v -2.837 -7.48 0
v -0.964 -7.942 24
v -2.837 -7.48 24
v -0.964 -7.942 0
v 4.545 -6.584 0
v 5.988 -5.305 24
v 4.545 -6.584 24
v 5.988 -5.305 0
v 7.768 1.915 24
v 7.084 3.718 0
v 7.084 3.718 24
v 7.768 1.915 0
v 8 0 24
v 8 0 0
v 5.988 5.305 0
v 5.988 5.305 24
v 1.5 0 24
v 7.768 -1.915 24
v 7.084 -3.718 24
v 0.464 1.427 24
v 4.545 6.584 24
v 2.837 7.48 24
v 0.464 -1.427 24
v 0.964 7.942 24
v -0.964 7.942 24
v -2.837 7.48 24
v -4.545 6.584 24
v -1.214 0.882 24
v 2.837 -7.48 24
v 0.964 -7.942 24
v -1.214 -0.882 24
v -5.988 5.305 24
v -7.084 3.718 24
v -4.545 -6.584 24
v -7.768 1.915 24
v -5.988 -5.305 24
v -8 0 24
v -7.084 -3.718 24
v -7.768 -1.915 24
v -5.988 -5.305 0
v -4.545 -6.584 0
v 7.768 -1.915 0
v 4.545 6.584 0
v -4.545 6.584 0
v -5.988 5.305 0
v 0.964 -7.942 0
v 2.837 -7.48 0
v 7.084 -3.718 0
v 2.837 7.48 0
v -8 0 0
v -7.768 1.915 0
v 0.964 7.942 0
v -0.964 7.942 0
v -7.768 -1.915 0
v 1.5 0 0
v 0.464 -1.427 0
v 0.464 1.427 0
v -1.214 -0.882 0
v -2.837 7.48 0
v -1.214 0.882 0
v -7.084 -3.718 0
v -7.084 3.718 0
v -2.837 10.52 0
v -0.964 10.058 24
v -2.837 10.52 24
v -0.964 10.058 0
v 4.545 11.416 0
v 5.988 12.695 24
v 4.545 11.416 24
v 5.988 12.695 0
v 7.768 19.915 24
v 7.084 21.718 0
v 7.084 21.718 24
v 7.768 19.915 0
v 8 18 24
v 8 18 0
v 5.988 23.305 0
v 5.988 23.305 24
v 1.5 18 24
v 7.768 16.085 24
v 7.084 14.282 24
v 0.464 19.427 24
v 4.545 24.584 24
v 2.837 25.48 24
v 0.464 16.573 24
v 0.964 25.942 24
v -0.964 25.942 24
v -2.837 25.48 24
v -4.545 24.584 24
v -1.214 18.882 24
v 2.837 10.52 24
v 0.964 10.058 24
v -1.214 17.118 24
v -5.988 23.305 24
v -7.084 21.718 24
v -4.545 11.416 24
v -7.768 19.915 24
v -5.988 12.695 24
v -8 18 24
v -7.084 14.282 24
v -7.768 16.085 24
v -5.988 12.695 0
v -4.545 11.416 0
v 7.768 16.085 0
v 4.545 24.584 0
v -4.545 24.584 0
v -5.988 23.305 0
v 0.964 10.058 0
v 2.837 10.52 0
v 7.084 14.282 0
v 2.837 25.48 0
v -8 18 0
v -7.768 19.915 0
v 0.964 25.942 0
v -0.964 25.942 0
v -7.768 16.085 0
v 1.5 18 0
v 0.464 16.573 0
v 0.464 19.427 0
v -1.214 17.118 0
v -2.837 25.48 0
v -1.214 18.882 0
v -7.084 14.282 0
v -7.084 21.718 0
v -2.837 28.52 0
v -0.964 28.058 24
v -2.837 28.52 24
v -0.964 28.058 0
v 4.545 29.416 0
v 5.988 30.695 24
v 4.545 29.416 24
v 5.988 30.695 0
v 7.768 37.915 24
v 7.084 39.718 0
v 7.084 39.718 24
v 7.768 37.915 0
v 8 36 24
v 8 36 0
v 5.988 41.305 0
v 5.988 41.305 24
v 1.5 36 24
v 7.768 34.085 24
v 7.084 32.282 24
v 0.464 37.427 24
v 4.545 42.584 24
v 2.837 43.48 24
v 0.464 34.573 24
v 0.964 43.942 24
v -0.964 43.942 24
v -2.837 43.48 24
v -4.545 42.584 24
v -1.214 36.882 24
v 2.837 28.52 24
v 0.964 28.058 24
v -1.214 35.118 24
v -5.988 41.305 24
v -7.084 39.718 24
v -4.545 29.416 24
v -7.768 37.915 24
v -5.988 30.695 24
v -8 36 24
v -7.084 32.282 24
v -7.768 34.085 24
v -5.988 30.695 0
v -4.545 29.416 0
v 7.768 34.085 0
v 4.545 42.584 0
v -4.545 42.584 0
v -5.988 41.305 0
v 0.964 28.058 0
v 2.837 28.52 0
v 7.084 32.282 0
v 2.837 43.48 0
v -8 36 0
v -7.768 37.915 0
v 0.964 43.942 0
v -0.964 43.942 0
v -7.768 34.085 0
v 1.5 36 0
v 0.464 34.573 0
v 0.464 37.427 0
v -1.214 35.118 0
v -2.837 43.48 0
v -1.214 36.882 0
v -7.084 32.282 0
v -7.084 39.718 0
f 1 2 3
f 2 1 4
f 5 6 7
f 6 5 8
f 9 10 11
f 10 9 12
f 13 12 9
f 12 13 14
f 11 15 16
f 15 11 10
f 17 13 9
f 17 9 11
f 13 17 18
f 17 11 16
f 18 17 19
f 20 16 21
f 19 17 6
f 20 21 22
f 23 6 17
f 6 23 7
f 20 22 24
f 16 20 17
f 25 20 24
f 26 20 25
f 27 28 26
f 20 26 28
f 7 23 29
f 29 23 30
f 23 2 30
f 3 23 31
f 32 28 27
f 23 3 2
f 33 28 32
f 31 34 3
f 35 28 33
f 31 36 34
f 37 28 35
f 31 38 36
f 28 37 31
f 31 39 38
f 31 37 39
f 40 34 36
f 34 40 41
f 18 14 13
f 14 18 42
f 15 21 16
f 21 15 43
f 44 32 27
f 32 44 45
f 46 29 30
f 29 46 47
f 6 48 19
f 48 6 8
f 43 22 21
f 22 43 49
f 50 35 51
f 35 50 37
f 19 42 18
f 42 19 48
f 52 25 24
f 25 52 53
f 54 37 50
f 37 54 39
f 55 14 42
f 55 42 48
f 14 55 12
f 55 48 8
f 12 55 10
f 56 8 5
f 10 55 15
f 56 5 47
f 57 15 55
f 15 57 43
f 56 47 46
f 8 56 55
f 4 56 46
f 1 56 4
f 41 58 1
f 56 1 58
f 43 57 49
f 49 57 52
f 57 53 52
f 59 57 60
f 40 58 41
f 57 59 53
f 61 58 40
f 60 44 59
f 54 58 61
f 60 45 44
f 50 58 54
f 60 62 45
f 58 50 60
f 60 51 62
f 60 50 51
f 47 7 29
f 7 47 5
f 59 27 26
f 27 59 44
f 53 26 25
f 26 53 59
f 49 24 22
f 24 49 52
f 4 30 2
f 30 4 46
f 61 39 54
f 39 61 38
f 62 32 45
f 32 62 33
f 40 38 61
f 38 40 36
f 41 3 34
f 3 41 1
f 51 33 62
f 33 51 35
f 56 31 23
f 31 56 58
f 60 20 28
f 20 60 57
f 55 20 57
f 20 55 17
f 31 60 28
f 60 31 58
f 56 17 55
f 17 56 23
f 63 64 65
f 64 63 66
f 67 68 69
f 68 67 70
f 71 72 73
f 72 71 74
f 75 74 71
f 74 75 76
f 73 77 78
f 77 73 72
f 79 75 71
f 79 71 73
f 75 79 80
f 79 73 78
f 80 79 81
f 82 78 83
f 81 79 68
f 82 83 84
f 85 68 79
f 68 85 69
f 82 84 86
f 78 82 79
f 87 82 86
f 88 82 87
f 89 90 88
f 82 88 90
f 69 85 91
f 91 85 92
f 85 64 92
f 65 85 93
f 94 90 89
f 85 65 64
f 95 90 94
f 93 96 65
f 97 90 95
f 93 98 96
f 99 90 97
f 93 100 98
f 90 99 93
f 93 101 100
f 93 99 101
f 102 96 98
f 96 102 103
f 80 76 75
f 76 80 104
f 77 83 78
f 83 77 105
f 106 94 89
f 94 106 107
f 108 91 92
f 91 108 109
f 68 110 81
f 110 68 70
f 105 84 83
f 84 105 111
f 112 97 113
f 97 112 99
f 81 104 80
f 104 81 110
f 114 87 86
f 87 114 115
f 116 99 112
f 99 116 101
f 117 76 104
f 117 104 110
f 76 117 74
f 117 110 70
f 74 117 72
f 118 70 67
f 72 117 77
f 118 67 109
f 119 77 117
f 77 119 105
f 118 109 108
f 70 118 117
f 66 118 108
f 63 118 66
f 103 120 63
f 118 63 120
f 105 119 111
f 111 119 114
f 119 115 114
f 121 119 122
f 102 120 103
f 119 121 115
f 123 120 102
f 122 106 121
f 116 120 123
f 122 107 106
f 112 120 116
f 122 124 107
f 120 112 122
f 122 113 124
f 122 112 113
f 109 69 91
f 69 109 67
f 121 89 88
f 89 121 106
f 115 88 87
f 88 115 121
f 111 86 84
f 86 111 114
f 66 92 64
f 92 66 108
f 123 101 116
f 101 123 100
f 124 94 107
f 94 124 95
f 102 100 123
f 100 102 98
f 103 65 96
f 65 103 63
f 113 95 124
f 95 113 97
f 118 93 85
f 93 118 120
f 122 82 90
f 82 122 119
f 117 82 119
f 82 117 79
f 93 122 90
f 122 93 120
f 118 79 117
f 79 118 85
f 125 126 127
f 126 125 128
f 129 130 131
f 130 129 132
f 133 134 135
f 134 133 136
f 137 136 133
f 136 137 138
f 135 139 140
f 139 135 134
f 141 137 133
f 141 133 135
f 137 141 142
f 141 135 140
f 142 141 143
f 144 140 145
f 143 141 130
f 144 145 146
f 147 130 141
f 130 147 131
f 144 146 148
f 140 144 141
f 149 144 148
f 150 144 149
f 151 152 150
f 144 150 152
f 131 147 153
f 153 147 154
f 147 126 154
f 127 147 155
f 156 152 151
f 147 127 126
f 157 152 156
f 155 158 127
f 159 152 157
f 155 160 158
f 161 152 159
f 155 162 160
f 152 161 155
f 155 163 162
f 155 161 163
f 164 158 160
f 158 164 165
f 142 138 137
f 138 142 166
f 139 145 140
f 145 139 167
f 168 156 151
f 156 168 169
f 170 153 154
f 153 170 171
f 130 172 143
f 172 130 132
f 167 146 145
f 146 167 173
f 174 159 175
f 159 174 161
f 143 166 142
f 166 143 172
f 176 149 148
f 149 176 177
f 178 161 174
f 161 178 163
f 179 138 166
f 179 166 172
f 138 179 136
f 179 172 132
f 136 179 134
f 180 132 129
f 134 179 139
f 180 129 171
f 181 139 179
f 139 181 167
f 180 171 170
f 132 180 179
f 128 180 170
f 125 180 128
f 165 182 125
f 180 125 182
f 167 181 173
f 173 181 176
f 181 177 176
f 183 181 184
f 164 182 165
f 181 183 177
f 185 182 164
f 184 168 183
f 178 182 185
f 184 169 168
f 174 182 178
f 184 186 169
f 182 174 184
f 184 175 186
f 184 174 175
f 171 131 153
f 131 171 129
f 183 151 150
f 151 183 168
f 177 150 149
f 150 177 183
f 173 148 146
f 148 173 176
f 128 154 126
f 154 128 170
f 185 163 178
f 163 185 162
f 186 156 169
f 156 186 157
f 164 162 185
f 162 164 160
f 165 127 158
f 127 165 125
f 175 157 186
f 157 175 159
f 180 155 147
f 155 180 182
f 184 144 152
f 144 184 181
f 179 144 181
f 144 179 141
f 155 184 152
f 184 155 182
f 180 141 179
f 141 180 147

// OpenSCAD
display=0;

sheet_thickness=6.25;
backplate_width=400;
backplate_height=400;
bottomplate_depth=200;

sideplate_height=150;
sideplate_depth=150;

slide_width=105;

//---------------------------------------------------------------------------
//_____________________ACRYLIC SHEETS__________________________________________

module bottomplate (){
	difference(){
		union(){
			translate([0,-bottomplate_depth,0])
			cube([backplate_width,bottomplate_depth,sheet_thickness]);
		}
	}
}

module backplate (){
	difference(){
		union(){
			translate([0,0,0])
			cube([backplate_width,sheet_thickness,backplate_height]);
		}
		translate([275,20,220])
		rotate([90,0,0])
		cylinder(r=4,h=100);		
	}
}

module beltplate (){
	union(){
		difference(){
			union(){
				translate([50,50,0])
				cylinder(r=50,h=sheet_thickness);	
				translate([180,50,0])
				cylinder(r=50,h=sheet_thickness);	
			}	
		translate([50,0,-1])
		cube([130,100,sheet_thickness+2]);
		}
		translate([50,0,0])
		cube([130,100,sheet_thickness]);	
	}	
}

module beltplate_holes (){
	translate([25,80,-50])
	cylinder(r=1.7,h=100);
	translate([25,20,-50])
	cylinder(r=1.7,h=100);

	translate([230-10,50,-50])
	cylinder(r=1.7,h=100);
}


module sideplateleft(){
	union(){
		translate([sheet_thickness,0,sheet_thickness])
		rotate([0,-90,0])
		linear_extrude(height=sheet_thickness)
		polygon(points=[[0,0],[0,-sideplate_depth],[sideplate_height,0]], paths=[[0,1,2]]);
		
		translate([0,-50,sheet_thickness])
		cube([sheet_thickness,50,230-sheet_thickness]);
	}
}

module sideplateright(){

	translate([backplate_width,0,sheet_thickness])
	rotate([0,-90,0])
	linear_extrude(height=sheet_thickness)

	polygon(points=[[0,0],[0,-sideplate_depth],[sideplate_height,0]], paths=[[0,1,2]]);

}

module leftslide(){
	cube([248,slide_width,sheet_thickness]);
}

module rightslide(){
	cube([186,slide_width,sheet_thickness]);
}

module slidefront(){
	difference(){
		linear_extrude(height=	sheet_thickness)
		polygon(points=[[50,0],[50,5],[234,170],[318,170],[backplate_width,5],[backplate_width,0]] , paths=[[0,1,2,3,4,5]]);	
	
	}
}

module elecfront(){
	difference(){
		translate([0,-sheet_thickness-slide_width,backplate_height])
		rotate([-90,0,0])
		linear_extrude(height=
	sheet_thickness)
		polygon(points=[[0,0],[0,170],[234,170],[50,5],[50,0]] , paths=[[0,1,2,3,4,5]]);	
	
	}
}

module elecleft (){
	difference(){
		translate([0,-slide_width,230+sheet_thickness])
		cube([sheet_thickness,slide_width,	backplate_height-230-sheet_thickness*2]);
	}
}

module electop (){
	difference(){
		translate([0,-slide_width,backplate_height-sheet_thickness])
		cube([48,slide_width,sheet_thickness]);
	}
}

module elecbottom (){
	difference(){
		translate([0,-slide_width,230])
		cube([234-4,slide_width,sheet_thickness]);
	}
}

module elecfront_connectors (){
	difference(){
		cube([24,sheet_thickness,12]);
		translate([12,-1,6])
		rotate([-90,0,0])
		cylinder(r=1.7,h=100);
	}


}

//-------------------------------------------------------------------------
//___________________________3D PRINTED PARTS______________________________

module rotor(){
	difference(){
		union(){
			translate([0,0,0])
			cylinder(r=33.7,h=89,$fn=100);
			for ( i = [-100,-75,-50,-25,0,25,50,75,100] )
			{
			    rotate( [0, 0,  i ])
			    translate([0, 31.5, 0])
			    cylinder(r=3,h=89,$fn=20);
			}
		}	
		translate([0,25,-1])
		cylinder(r=8.6,h=110,$fn=50);
		translate([0,27,-1])
		cylinder(r=8.7,h=110,$fn=50);

		translate([-8,24,-1]) 
		rotate([0,0,15])
		cube([5,40,110]);

		translate([8,24,-1])
		rotate([0,0,-15])
		translate([-5,0,0])
		cube([5,40,110]);

		translate([0,0,-2])
		cylinder(r=4.1,h=150,$fn=25);
	}
}

module sled(){
	difference(){
		union(){
			intersection(){
				translate([0,-10,0])	
				cylinder(r=26,h=12,$fn=100);
				translate([0,-38,-1])	
				cylinder(r=40,h=50,$fn=100);	
			}		
			translate([0,-25,0])	
			cylinder(r=10,h=36,$fn=50);
			translate([-88,-33.5,0])
			cube([85,13,12]);
			translate([-88,-33.5,0])
			cube([18,13,26]);

		}	
	translate([0,-27,-1])	
	cylinder(r=3.1,h=100,$fn=20);
	translate([17.5,-12,-1])	
	cylinder(r=4,h=50);
	translate([-17.5,-12,-1])	
	cylinder(r=4,h=50);

	translate([0,-27,-0.1])
	difference(){
		translate([-15,-3.5,0])
		cube([15,7,25]);
		translate([-25,-4.5,25])
		rotate([-90,0,0])
		cylinder(r=22,h=9);
	}
	
	translate([0,-27,1])	
	rotate([0,-90,0])
	rotate([0,0,30])
	cylinder(r=3.6,h=100,$fn=6);	

	translate([-80,-27,15.5])	
	cylinder(r=4.7,h=100,$fn=20);

	translate([-80,-40,19])	
	rotate([-90,0,0])
	cylinder(r=2,h=100,$fn=6);
	}
}


module frontplate(){
	difference(){
		union(){
			translate([0,0,0])
			linear_extrude(height = 5, center = false, convexity = 10, twist = 0)
			polygon(points=[[25,0],[42,10],[42,22],[-41,22],[-41,10],[-25,0]]);
			intersection() {
				cylinder(r=36,h=5,$fn=100);
				translate([0,15,-1])
				cylinder(r=29,h=7,$fn=100);	
			}			
			translate([-17.5,12,0])
			cylinder(r=10.5,h=48,$fn=100);	
			translate([17.5,12,0])
			cylinder(r=10.5,h=48,$fn=100);	

			translate([0,0,0])
			cylinder(r=14,h=7.5,$fn=100);	
			
		}	
	translate([0,0,-1])
	cylinder(r=7,h=100);	

	translate([17.5,12,-1])
	cylinder(r=5.5,h=100);	

	translate([-17.5,12,-1])
	cylinder(r=5.5,h=100);	

	translate([0,27,-1])
	cylinder(r=7,h=7,$fn=40);

	translate([-17.5,12,49-24])
	cylinder(r=7.75,h=38,$fn=40);	 
	translate([17.5,12,49-24])
	cylinder(r=7.75,h=38,$fn=40);	

	translate([0,0,2])
	cylinder(r=8.25,h=6,$fn=40);	
	translate([-33,17,-20])
	cylinder(r=1.7,h=38,$fn=10);	 
	translate([33,17,-20])
	cylinder(r=1.7,h=38,$fn=10);
	}

}

module frontplate_holes(){	

	translate([0,27,-50])
	cylinder(r=5.5,h=100);		

	translate([-33,17,-50])
	cylinder(r=1.7,h=108,$fn=10);	 
	translate([33,17,-20])
	cylinder(r=1.7,h=38,$fn=10);

}

module belt_protector_spacer(){
	difference(){
		cylinder(r=8,h=24);
		translate([0,0,-1])
		cylinder(r=1.5,h=100);
	}
}

module opto_pcb_holder(){
	difference(){
		union(){
			translate([0,-7.5,0]){
			cube([32,15,4]);
			cube([5,15,18]);
			}
		}
		translate([8,-2,-1])
		cube([20,4,10]);
		translate([-1,2.3,6])
		cube([10,3.7,9]);
	}
}


//----------------------------------------------------------------------------------
//___________________________ Mechanical parts______________________________________

module lm8uu(){
	difference(){
		cylinder(r=7.5,h=24);	
		translate([0,0,-1])
		cylinder(r=4,h=21);	
	}
}


module tube(){
	difference(){
		cylinder(r=8.4,h=102);
		translate([0,0,-1])
		cylinder(r=2.5,h=105);
	}
}

module firgelli30mm(){
	difference(){
		union(){
			translate([-4,-4.5,-4.5])
			cube([90,9,9]);
			translate([4.5,-6,-6])
			cube([73,12,12]);		
			translate([4.5,-11.5,-7.5])
			cube([37,18,15]);		
		}
	translate([0,0,-50])
	cylinder(r=2.3,h=100,$fn=20);
	translate([82,0,-50])
	cylinder(r=2.3,h=100,$fn=20);		
	}
}

module firgelli30mm_holes(){
	union(){
		translate([-4,-4.5,-4.5])
		cube([90,9,9]);
		translate([4.5,-6.5,-6.5])
		cube([73,13,13]);		
		translate([4.5,-11.5,-7.5])
		cube([37,18,15]);		
		translate([0,0,-50])
		cylinder(r=2.3,h=100,$fn=20);
		translate([82,0,-50])
		cylinder(r=2.3,h=100,$fn=20);		
	}
}


// stepper nema 17, with some extra space around
module stepper(){ 
	difference(){
		union(){
			translate([-21,-21,-40])	
				cube([42,42,40],center=false);
			cylinder(r=2.5,h=30,center=false);
			cylinder(r=12,h=4,center=true);
			translate([-15.5,-15.5,0])
				cylinder(r=1.5,h=10,center=false);
			translate([15.5,-15.5,0])
				cylinder(r=1.5,h=10,center=false);
			translate([15.5,15.5,0])
				cylinder(r=1.5,h=10,center=false);
			translate([-15.5,15.5,0])
				cylinder(r=1.5,h=10,center=false);

			translate([0,0,10])
				cylinder(r=8,h=15,center=false);				
		}
	}
}

module stepper_holes(){ 
	difference(){
		union(){
			translate([-21.5,-21.5,-49])	
				cube([43,43,49],center=false);
			cylinder(r=2.5,h=70,center=true);
			cylinder(r=14,h=10,center=false);
			cylinder(r=6,h=35,center=false);
			translate([-15.5,-15.5,0])
				cylinder(r=2.2,h=80,center=true,$fn=12);
			translate([15.5,-15.5,0])
				cylinder(r=2.2,h=80,center=true,$fn=12);
			translate([15.5,15.5,0])
				cylinder(r=2.2,h=80,center=true,$fn=12);
			translate([-15.5,15.5,0])
				cylinder(r=2.2,h=80,center=true,$fn=12);
		
		}
	}
}

module arduino_uno(){
	difference(){
		union(){
			cube([68.6,53.3,12]);
			translate([-7,33,2.75])
			cube([17,12,10.5]);
			translate([-2,4,2])
			cube([14,9,11]);			
		}
		translate([14,2.5,-1])
		cylinder(r=1.5,h=20);
		translate([15.3,50.7,-1])
		cylinder(r=1.5,h=20);	
		translate([66.1,7.6,-1])
		cylinder(r=1.5,h=20);	
		translate([66.1,35.5,-1])
		cylinder(r=1.5,h=20);	
	}
}

module arduino_uno_holes(){
	union(){
		translate([-10,32,2])
		cube([50,14,12]);
		translate([-10,3,2])
		cube([50,11,13]);	

		translate([14,2.5,-20])
		cylinder(r=1.7,h=50);
		translate([15.3,50.7,-20])
		cylinder(r=1.7,h=50);	
		translate([66.1,7.6,-20])
		cylinder(r=1.7,h=50);	
		translate([66.1,35.5,-20])
		cylinder(r=1.7,h=50);	
	}
}

module newheaven_lcd(){
	difference(){
		union(){
			cube([80,36,4]);
			translate([5,5,4])
			cube([71,26,9]);		
		}
		translate([2.5,3,-1])
		cylinder(r=1.7,h=20);
		translate([77.5,3,-1])
		cylinder(r=1.7,h=20);
		translate([77.5,33,-1])
		cylinder(r=1.7,h=20);
		translate([2.5,33,-1])
		cylinder(r=1.7,h=20);
	}
}

module newheaven_lcd_holes(){
	union(){
		translate([4.5,4.5,-1])
		cube([72,27,25]);		
		translate([2.5,3,-1])
		cylinder(r=1.7,h=25);
		translate([77.5,3,-1])
		cylinder(r=1.7,h=25);
		translate([77.5,33,-1])
		cylinder(r=1.7,h=25);
		translate([2.5,33,-1])
		cylinder(r=1.7,h=25);
	}
}

module vac_sensor_pcb(){
	difference(){
		union(){
			cube([27,48,5]);
		}
		translate([4,44,-1])
		cylinder(r=1.7,h=50);
		translate([24,44,-1])
		cylinder(r=1.7,h=50);
	}
}

module vac_sensor_pcb_holes(){
	union(){
		translate([4,44,-25])
		cylinder(r=1.7,h=50);
		translate([24,44,-25])
		cylinder(r=1.7,h=50);
	}
}

module rot_encoder_pcb(){
	difference(){
		union(){
			cube([20,34,1]);
			translate([10,14,0])
			cylinder(r=3.5,h=20);
			translate([4,8,0])
			cube([12,12,6]);			

		}
		translate([10,3,-1])
		cylinder(r=1.7,h=50);
		translate([10,29.5,-1])
		cylinder(r=1.7,h=50);
	}
}

module rot_encoder_holes(){
	translate([10,3,-20])
	cylinder(r=1.7,h=100);
	translate([10,29.5,-20])
	cylinder(r=1.7,h=100);
	translate([10,14,0])
	cylinder(r=4,h=20);
}

module 8256_solenoid(){
	difference(){
		translate([-16.5,-12.5,0])
		cube([33,25,53]);			
		translate([-25,0,7]) rotate([0,90,0])
		cylinder(r=5,h=50);
	}	
}

//-----------------------------------------------------------------------------------------------------------------
//__________________________________ DISPLAY___________________________________________________________
//-----------------------------------------------------------------------------------------------------------------

if (display==1) {
	
	translate([195,-60,230+15])
	rotate([0,0,-90])
	firgelli30mm();

	
	translate([275,-01,247])
	rotate([90,0,0])
	tube();
	
	translate([275,-180,220])
	rotate([-90,0,0])
	sled();
		
	translate([275,-98,220])
	rotate([90,0,0])
	rotate([180,0,0])
	rotate([0,0,180])
	rotor();
	
	translate([275-17.5,-136-21,220+12])
	rotate([-90,0,0])
	lm8uu();
	translate([275+17.5,-136-21,220+12])
	rotate([-90,0,0])
	lm8uu();

	color([0.2, 0.2, 0.2, 1]) 
	translate([20,-15,230+sheet_thickness+8])
	8256_solenoid();
	
	color([0.2, 0.2, 0.2, 1]) 
	translate([20,-15-37.5,230+sheet_thickness+8])
	8256_solenoid();
	
	color([0.2, 0.2, 0.2, 1]) 
	translate([20,-15-75,230+sheet_thickness+8])
	8256_solenoid();
	
	translate([275-120,-2,259])
	rotate([-90,0,0])
	stepper();

	translate([sheet_thickness,-2,400-85])
	rotate([90,0,0])
	arduino_uno();

	translate([sheet_thickness,-100,400-85])
	rotate([90,0,0])
	newheaven_lcd();

	translate([85,0,280])
	rotate([90,0,0])
	vac_sensor_pcb();

	translate([100,-95,250])
	rotate([90,0,0])
	rot_encoder_pcb();
	
	translate([100-12,-111+sheet_thickness,230+sheet_thickness]) 
	elecfront_connectors();

	translate([sheet_thickness,-111+sheet_thickness,400-sheet_thickness-12]) 
	elecfront_connectors();

	translate([275,-111,220]) rotate([90,0,0])
	frontplate();
	


	color([0.7, 0.7, 0.9, 0.5]) 
	bottomplate();

	difference(){
		color([0.7, 0.7, 0.9, 0.5]) 
		backplate();

		for ( i = [0 : 0.25 : 5] ){
			translate([275-118-i,-2,259])
			rotate([-90,0,0])
			stepper_holes();
		}

		// opto_mount_hole
		translate([275-54,20,220+18.5])
		rotate([90,0,0])
		cylinder(r=1.7,h=100);
		// opto_wire_hole
		translate([195,20,245])
		rotate([90,0,0])
		cylinder(r=5,h=100);
		
		translate([sheet_thickness,0,400-85])
		rotate([90,0,0])
		arduino_uno_holes();
		translate([85,0,280])
		rotate([90,0,0])
		vac_sensor_pcb_holes();	
		color([0.7, 0.7, 0.9, 0.5]) 
		translate([105,25,273])
		rotate([0,18,0])	
		rotate([90,0,0])
		translate([0,-50,0])	
		beltplate_holes();
	}
	

	color([0.7, 0.7, 0.9, 0.5]) 
	translate([50,-slide_width,backplate_height-sheet_thickness+1.5])
	rotate([0,41.9,0])
	leftslide();
	
	color([0.7, 0.7, 0.9, 0.5])
	translate([backplate_width-sheet_thickness+1,-slide_width,backplate_height-0])
	rotate([0,180-63.5,0]) 
	rightslide();
	
	difference(){
	 	color([0.7, 0.7, 0.9, 0.5]) 
		elecleft();
		translate([10,-15,230+sheet_thickness+16])
		rotate([0,-90,0])
		cylinder(r=9,h=50);
		translate([10,-15-37.5,230+sheet_thickness+16])
		rotate([0,-90,0])
		cylinder(r=9,h=50);
		translate([10,-15-75,230+sheet_thickness+16])
		rotate([0,-90,0])
		cylinder(r=9,h=50);
		translate([sheet_thickness,-2,400-85])
		rotate([90,0,0])
		arduino_uno_holes();
	}


 	color([0.7, 0.7, 0.9, 0.5]) 
	electop();

	difference(){
	 	color([0.7, 0.7, 0.9, 0.5]) 
		elecbottom();
		translate([195,-60,230+15])
		rotate([0,0,-90])
		firgelli30mm_holes();
		translate([20,-33.75,220])
		cylinder(r=1.7,h=50);	
		translate([20,-33.75-37.5,220])
		cylinder(r=1.7,h=50);	
	}


	difference(){
		color([0.7, 0.7, 0.9, 0.5]) 
		translate([0,-sheet_thickness-slide_width,backplate_height])
		rotate([-90,0,0])
		slidefront();

		translate([275,-111,220]) rotate([90,0,0])
		frontplate_holes();
	}

	difference(){
		color([0.7, 0.7, 0.9, 0.5]) 
		elecfront();
		translate([sheet_thickness,-100,400-85])
		rotate([90,0,0])
		newheaven_lcd_holes();
		translate([100,-100,250])
		rotate([90,0,0])
		rot_encoder_holes();
		translate([57,-100,230+sheet_thickness+16])
		rotate([90,0,0])
		cylinder(r=9,h=100);
		translate([195,-60,230+15])
		rotate([0,0,-90])
		firgelli30mm_holes();
		// holes to mount front piece
		translate([sheet_thickness+12,-100,400-sheet_thickness-6])
		rotate([90,0,0])
		cylinder(r=2, h=100);		
		translate([100,-100,230+sheet_thickness+6])
		rotate([90,0,0])
		cylinder(r=2, h=100);		
	}

	translate([245,sheet_thickness,239])
	rotate([-90,0,0])
	rotate([0,0,180])
	opto_pcb_holder();

	translate([119,sheet_thickness,237])
	rotate([-90,0,0])
	belt_protector_spacer();
	translate([137.2,sheet_thickness,294])
	rotate([-90,0,0])
	belt_protector_spacer();
	translate([314.1,sheet_thickness,204.7])
	rotate([-90,0,0])
	belt_protector_spacer();

	color([0.7, 0.7, 0.9, 0.5]) 
	translate([105,sheet_thickness*2+24,273])
	rotate([0,18,0])	
	rotate([90,0,0])
	translate([0,-50,0])
	difference(){
		beltplate();	
		beltplate_holes();
	}

	color([0.7, 0.7, 0.9, 0.5]) 
	sideplateleft();

	color([0.7, 0.7, 0.9, 0.5]) 
	sideplateright();


}

	

//---------------------------------------------------------------------------------------
//____________SHEETS ________________________________
//-------------------------------------------------------------------------------------.
//
//$fn=50;
//projection(cut = true) {
//	translate([0,0,-1])
//	bottomplate();
//	
//	//projection(cut = true) 
//	translate([0,1,sheet_thickness-1])
//	rotate([-90,0,0])
//	difference(){
//		backplate();
//	
//		translate([275-118,-2,259])
//		rotate([-90,0,0])
//		stepper_holes();
//		translate([275-118.5,-2,259])
//		rotate([-90,0,0])
//		stepper_holes();
//		translate([275-119,-2,259])
//		rotate([-90,0,0])
//		stepper_holes();
//		translate([275-119.5,-2,259])
//		rotate([-90,0,0])
//		stepper_holes();
//		translate([275-120,-2,259])
//		rotate([-90,0,0])
//		stepper_holes();
//		translate([275-120.5,-2,259])
//		rotate([-90,0,0])
//		stepper_holes();
//		translate([275-121,-2,259])
//		rotate([-90,0,0])
//		stepper_holes();
//		translate([275-121.5,-2,259])
//		rotate([-90,0,0])
//		stepper_holes();
//		translate([275-122,-2,259])
//		rotate([-90,0,0])
//		stepper_holes();
//		translate([275-122.5,-2,259])
//		rotate([-90,0,0])
//		stepper_holes();
//		translate([275-123,-2,259])
//		rotate([-90,0,0])
//		stepper_holes();
//	
//		// opto_mount_hole
//		translate([275-54,20,220+18.5])
//		rotate([90,0,0])
//		cylinder(r=1.7,h=100);
//		// opto_wire_hole
//		translate([205,20,245])
//		rotate([90,0,0])
//		cylinder(r=5,h=100);
//		
//		translate([sheet_thickness,0,400-85])
//		rotate([90,0,0])
//		arduino_uno_holes();
//		translate([85,0,280])
//		rotate([90,0,0])
//		vac_sensor_pcb_holes();	
//		color([0.7, 0.7, 0.9, 0.5]) 
//		translate([105,25,273])
//		rotate([0,18,0])	
//		rotate([90,0,0])
//		translate([0,-50,0])	
//		beltplate_holes();
//	}
//	
//	translate([0,1,-1])
//	rotate([0,-90,0])
//	sideplateleft();
//	
//	translate([401,1,0-1])
//	rotate([0,90,0]) 
//	translate([-400,0,0])
//	sideplateright();
//	
//	translate([0,402,0-1])
//	rotate([180,0,0]) 
//	translate([0,0,-400])
//	electop();
//	
//	translate([0,1,-1])
//	rotate([0,-90,0])
//		difference(){
//			elecleft();
//			translate([10,-15,230+sheet_thickness+16])
//			rotate([0,-90,0])
//			cylinder(r=9,h=50);
//			translate([10,-15-37.5,230+sheet_thickness+16])
//			rotate([0,-90,0])
//			cylinder(r=9,h=50);
//			translate([10,-15-75,230+sheet_thickness+16])
//			rotate([0,-90,0])
//			cylinder(r=9,h=50);
//			translate([sheet_thickness,-2,400-85])
//			rotate([90,0,0])
//			arduino_uno_holes();
//		}
//	
//	translate([0,-320,0-1])
//	rotate([0,0,0]) 
//	translate([0,110,-230])
//		difference(){
//			elecbottom();
//			translate([195,-60,230+15])
//			rotate([0,0,-90])
//			firgelli30mm_holes();
//			translate([20,-33.75,220])
//			cylinder(r=1.7,h=50);	
//			translate([20,-33.75-37.5,220])
//			cylinder(r=1.7,h=50);	
//		}
//	
//	translate([600,-0,-1])
//	leftslide();
//	
//	translate([600,-110,-1]) 
//	rightslide();
//	
//	translate([600,112,sheet_thickness-2]) 
//	rotate([-90,0,0]) 
//	translate([0,110,-230])
//		difference(){
//			translate([0,-sheet_thickness-slide_width,backplate_height])
//			rotate([-90,0,0])
//			slidefront();
//	
//			translate([275,-111,220]) rotate([90,0,0])
//			frontplate_holes();
//		}
//	
//	translate([500,112,sheet_thickness-2]) 
//	rotate([-90,0,0]) 
//	translate([0,110,-230])
//		difference(){ 
//			elecfront();
//			translate([sheet_thickness,-100,400-85])
//			rotate([90,0,0])
//			newheaven_lcd_holes();
//			translate([100,-100,250])
//			rotate([90,0,0])
//			rot_encoder_holes();
//			translate([57,-100,230+sheet_thickness+16])
//			rotate([90,0,0])
//			cylinder(r=9,h=100);
//			translate([195,-60,230+15])
//			rotate([0,0,-90])
//			firgelli30mm_holes();
//			// holes to mount front piece
//			translate([sheet_thickness+12,-100,400-sheet_thickness-6])
//			rotate([90,0,0])
//			cylinder(r=2, h=100);		
//			translate([100,-100,230+sheet_thickness+6])
//			rotate([90,0,0])
//			cylinder(r=2, h=100);		
//		}
//
//	translate([-300,50,0])
//	difference(){
//		beltplate();	
//		beltplate_holes();
//	}
//
//}


//---------------------------------------------------------------------------------------
//____________PRINT ________________________________
//-------------------------------------------------------------------------------------.


//frontplate();
//sled();
//opto_pcb_holder();
//rotor();

belt_protector_spacer();
translate([0,18,0])
belt_protector_spacer();
translate([0,36,0])
belt_protector_spacer();
